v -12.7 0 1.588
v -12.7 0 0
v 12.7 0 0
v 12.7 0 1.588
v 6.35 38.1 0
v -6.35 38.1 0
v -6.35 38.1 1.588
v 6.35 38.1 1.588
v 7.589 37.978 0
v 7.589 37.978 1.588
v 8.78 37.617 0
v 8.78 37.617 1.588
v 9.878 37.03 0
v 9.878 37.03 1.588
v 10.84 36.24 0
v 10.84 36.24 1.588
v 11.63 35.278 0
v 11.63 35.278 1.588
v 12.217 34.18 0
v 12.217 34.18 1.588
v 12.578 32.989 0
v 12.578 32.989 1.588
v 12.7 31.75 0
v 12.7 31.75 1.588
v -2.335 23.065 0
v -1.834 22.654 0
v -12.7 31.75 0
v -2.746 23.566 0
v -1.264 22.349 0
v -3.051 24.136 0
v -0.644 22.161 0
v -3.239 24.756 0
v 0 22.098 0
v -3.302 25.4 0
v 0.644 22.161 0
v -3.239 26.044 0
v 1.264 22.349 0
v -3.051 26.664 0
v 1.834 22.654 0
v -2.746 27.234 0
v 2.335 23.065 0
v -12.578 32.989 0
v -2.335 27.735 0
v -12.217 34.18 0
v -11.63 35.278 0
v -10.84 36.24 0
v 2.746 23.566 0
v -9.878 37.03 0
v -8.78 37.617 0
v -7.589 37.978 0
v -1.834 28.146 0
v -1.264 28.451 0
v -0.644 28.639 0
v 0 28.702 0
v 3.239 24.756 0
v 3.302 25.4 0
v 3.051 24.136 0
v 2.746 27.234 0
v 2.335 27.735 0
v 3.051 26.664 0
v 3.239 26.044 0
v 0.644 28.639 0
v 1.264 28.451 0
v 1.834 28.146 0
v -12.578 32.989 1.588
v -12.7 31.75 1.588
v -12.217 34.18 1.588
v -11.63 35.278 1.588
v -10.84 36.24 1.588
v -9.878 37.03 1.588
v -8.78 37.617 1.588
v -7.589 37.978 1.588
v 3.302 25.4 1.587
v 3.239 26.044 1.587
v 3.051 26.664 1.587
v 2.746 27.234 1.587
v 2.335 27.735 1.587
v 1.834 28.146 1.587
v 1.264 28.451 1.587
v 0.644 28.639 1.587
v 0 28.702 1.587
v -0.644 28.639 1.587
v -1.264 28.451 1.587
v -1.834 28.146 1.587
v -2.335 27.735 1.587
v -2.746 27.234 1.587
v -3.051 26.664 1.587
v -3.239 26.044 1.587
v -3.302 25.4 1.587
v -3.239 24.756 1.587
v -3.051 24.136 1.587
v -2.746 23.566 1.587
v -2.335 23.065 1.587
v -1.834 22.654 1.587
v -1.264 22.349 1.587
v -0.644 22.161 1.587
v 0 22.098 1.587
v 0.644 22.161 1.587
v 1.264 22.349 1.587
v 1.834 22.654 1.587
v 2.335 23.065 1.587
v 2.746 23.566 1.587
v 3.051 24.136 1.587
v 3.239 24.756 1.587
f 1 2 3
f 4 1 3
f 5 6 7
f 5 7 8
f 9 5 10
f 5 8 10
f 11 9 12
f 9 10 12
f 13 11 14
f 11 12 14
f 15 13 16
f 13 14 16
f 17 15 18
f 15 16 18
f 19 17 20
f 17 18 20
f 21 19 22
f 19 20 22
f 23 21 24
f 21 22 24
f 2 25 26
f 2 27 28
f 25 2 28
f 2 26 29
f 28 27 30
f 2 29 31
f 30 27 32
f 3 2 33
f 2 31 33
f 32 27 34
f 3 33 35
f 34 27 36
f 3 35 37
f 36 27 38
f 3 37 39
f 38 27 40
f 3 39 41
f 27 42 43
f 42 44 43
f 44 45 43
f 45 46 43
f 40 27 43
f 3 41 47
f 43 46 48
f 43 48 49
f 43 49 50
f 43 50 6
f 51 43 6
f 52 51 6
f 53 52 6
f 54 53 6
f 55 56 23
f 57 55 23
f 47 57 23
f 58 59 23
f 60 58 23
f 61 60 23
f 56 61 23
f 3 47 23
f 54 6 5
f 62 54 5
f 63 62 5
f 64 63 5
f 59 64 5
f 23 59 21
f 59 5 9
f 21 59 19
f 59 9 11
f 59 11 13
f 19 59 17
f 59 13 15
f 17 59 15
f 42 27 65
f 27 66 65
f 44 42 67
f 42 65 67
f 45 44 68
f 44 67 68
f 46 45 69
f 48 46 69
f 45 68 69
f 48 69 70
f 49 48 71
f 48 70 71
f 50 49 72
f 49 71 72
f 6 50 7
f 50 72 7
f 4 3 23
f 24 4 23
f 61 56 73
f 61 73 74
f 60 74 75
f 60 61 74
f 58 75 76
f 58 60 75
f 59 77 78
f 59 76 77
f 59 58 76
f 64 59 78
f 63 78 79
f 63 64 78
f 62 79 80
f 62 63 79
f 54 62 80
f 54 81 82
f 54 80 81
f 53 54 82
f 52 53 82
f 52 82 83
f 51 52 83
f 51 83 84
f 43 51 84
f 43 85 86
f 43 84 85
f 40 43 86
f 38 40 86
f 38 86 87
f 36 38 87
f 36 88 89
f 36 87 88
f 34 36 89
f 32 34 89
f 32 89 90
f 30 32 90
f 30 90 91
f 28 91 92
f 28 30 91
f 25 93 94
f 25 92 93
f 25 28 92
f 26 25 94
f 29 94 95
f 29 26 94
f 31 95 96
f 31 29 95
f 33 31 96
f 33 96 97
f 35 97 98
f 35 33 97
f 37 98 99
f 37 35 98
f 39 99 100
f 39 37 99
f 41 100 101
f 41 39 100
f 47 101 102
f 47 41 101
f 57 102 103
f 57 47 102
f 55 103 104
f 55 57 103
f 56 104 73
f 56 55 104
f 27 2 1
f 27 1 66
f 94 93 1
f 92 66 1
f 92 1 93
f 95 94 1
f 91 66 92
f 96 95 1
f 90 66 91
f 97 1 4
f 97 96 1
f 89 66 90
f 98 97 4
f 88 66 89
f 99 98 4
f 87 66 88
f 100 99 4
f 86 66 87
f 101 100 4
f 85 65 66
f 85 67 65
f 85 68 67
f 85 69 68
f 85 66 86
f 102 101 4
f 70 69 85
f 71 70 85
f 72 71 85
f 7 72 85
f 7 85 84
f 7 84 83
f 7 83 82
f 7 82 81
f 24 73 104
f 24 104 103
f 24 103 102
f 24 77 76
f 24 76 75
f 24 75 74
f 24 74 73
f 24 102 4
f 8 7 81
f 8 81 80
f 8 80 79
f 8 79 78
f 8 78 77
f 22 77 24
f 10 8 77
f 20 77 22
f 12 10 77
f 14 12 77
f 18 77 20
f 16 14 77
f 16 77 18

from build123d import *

# Parameters (mm, degrees)
SKETCH1_W               = 25.4
SKETCH1_H               = 38.1
BOSS_EXTRUDE1_DEPTH     = 1.5875
CUT_EXTRUDE1_DEPTH      = 41.192289761
CUT_EXTRUDE1_DEPTH_BACK = 41.192289761
SKETCH2_R               = 3.302
FILLET1_R               = 6.35


with BuildPart() as part:
    # Sketch1 → Boss-Extrude1 (new body)
    with BuildSketch(Plane.XY):
        with Locations((0, 19.05)):
            Rectangle(SKETCH1_W, SKETCH1_H)
    extrude(amount=BOSS_EXTRUDE1_DEPTH)

    # Sketch2 → Cut-Extrude1 (cut, two sides: drawn at the far end of the back side and taken through both)
    with BuildSketch(Plane.XY.offset(1.5875).offset(-CUT_EXTRUDE1_DEPTH_BACK)):
        with Locations((0, 25.4)):
            Circle(SKETCH2_R)
    extrude(amount=CUT_EXTRUDE1_DEPTH + CUT_EXTRUDE1_DEPTH_BACK, mode=Mode.SUBTRACT)

    # Fillet1
    fillet1_edges = [part.edges().sort_by_distance(p)[0] for p in [
        (-12.7, 38.1, 0.79375),
        (12.7, 38.1, 0.79375),
    ]]
    fillet(fillet1_edges, radius=FILLET1_R)


solid = part.part
